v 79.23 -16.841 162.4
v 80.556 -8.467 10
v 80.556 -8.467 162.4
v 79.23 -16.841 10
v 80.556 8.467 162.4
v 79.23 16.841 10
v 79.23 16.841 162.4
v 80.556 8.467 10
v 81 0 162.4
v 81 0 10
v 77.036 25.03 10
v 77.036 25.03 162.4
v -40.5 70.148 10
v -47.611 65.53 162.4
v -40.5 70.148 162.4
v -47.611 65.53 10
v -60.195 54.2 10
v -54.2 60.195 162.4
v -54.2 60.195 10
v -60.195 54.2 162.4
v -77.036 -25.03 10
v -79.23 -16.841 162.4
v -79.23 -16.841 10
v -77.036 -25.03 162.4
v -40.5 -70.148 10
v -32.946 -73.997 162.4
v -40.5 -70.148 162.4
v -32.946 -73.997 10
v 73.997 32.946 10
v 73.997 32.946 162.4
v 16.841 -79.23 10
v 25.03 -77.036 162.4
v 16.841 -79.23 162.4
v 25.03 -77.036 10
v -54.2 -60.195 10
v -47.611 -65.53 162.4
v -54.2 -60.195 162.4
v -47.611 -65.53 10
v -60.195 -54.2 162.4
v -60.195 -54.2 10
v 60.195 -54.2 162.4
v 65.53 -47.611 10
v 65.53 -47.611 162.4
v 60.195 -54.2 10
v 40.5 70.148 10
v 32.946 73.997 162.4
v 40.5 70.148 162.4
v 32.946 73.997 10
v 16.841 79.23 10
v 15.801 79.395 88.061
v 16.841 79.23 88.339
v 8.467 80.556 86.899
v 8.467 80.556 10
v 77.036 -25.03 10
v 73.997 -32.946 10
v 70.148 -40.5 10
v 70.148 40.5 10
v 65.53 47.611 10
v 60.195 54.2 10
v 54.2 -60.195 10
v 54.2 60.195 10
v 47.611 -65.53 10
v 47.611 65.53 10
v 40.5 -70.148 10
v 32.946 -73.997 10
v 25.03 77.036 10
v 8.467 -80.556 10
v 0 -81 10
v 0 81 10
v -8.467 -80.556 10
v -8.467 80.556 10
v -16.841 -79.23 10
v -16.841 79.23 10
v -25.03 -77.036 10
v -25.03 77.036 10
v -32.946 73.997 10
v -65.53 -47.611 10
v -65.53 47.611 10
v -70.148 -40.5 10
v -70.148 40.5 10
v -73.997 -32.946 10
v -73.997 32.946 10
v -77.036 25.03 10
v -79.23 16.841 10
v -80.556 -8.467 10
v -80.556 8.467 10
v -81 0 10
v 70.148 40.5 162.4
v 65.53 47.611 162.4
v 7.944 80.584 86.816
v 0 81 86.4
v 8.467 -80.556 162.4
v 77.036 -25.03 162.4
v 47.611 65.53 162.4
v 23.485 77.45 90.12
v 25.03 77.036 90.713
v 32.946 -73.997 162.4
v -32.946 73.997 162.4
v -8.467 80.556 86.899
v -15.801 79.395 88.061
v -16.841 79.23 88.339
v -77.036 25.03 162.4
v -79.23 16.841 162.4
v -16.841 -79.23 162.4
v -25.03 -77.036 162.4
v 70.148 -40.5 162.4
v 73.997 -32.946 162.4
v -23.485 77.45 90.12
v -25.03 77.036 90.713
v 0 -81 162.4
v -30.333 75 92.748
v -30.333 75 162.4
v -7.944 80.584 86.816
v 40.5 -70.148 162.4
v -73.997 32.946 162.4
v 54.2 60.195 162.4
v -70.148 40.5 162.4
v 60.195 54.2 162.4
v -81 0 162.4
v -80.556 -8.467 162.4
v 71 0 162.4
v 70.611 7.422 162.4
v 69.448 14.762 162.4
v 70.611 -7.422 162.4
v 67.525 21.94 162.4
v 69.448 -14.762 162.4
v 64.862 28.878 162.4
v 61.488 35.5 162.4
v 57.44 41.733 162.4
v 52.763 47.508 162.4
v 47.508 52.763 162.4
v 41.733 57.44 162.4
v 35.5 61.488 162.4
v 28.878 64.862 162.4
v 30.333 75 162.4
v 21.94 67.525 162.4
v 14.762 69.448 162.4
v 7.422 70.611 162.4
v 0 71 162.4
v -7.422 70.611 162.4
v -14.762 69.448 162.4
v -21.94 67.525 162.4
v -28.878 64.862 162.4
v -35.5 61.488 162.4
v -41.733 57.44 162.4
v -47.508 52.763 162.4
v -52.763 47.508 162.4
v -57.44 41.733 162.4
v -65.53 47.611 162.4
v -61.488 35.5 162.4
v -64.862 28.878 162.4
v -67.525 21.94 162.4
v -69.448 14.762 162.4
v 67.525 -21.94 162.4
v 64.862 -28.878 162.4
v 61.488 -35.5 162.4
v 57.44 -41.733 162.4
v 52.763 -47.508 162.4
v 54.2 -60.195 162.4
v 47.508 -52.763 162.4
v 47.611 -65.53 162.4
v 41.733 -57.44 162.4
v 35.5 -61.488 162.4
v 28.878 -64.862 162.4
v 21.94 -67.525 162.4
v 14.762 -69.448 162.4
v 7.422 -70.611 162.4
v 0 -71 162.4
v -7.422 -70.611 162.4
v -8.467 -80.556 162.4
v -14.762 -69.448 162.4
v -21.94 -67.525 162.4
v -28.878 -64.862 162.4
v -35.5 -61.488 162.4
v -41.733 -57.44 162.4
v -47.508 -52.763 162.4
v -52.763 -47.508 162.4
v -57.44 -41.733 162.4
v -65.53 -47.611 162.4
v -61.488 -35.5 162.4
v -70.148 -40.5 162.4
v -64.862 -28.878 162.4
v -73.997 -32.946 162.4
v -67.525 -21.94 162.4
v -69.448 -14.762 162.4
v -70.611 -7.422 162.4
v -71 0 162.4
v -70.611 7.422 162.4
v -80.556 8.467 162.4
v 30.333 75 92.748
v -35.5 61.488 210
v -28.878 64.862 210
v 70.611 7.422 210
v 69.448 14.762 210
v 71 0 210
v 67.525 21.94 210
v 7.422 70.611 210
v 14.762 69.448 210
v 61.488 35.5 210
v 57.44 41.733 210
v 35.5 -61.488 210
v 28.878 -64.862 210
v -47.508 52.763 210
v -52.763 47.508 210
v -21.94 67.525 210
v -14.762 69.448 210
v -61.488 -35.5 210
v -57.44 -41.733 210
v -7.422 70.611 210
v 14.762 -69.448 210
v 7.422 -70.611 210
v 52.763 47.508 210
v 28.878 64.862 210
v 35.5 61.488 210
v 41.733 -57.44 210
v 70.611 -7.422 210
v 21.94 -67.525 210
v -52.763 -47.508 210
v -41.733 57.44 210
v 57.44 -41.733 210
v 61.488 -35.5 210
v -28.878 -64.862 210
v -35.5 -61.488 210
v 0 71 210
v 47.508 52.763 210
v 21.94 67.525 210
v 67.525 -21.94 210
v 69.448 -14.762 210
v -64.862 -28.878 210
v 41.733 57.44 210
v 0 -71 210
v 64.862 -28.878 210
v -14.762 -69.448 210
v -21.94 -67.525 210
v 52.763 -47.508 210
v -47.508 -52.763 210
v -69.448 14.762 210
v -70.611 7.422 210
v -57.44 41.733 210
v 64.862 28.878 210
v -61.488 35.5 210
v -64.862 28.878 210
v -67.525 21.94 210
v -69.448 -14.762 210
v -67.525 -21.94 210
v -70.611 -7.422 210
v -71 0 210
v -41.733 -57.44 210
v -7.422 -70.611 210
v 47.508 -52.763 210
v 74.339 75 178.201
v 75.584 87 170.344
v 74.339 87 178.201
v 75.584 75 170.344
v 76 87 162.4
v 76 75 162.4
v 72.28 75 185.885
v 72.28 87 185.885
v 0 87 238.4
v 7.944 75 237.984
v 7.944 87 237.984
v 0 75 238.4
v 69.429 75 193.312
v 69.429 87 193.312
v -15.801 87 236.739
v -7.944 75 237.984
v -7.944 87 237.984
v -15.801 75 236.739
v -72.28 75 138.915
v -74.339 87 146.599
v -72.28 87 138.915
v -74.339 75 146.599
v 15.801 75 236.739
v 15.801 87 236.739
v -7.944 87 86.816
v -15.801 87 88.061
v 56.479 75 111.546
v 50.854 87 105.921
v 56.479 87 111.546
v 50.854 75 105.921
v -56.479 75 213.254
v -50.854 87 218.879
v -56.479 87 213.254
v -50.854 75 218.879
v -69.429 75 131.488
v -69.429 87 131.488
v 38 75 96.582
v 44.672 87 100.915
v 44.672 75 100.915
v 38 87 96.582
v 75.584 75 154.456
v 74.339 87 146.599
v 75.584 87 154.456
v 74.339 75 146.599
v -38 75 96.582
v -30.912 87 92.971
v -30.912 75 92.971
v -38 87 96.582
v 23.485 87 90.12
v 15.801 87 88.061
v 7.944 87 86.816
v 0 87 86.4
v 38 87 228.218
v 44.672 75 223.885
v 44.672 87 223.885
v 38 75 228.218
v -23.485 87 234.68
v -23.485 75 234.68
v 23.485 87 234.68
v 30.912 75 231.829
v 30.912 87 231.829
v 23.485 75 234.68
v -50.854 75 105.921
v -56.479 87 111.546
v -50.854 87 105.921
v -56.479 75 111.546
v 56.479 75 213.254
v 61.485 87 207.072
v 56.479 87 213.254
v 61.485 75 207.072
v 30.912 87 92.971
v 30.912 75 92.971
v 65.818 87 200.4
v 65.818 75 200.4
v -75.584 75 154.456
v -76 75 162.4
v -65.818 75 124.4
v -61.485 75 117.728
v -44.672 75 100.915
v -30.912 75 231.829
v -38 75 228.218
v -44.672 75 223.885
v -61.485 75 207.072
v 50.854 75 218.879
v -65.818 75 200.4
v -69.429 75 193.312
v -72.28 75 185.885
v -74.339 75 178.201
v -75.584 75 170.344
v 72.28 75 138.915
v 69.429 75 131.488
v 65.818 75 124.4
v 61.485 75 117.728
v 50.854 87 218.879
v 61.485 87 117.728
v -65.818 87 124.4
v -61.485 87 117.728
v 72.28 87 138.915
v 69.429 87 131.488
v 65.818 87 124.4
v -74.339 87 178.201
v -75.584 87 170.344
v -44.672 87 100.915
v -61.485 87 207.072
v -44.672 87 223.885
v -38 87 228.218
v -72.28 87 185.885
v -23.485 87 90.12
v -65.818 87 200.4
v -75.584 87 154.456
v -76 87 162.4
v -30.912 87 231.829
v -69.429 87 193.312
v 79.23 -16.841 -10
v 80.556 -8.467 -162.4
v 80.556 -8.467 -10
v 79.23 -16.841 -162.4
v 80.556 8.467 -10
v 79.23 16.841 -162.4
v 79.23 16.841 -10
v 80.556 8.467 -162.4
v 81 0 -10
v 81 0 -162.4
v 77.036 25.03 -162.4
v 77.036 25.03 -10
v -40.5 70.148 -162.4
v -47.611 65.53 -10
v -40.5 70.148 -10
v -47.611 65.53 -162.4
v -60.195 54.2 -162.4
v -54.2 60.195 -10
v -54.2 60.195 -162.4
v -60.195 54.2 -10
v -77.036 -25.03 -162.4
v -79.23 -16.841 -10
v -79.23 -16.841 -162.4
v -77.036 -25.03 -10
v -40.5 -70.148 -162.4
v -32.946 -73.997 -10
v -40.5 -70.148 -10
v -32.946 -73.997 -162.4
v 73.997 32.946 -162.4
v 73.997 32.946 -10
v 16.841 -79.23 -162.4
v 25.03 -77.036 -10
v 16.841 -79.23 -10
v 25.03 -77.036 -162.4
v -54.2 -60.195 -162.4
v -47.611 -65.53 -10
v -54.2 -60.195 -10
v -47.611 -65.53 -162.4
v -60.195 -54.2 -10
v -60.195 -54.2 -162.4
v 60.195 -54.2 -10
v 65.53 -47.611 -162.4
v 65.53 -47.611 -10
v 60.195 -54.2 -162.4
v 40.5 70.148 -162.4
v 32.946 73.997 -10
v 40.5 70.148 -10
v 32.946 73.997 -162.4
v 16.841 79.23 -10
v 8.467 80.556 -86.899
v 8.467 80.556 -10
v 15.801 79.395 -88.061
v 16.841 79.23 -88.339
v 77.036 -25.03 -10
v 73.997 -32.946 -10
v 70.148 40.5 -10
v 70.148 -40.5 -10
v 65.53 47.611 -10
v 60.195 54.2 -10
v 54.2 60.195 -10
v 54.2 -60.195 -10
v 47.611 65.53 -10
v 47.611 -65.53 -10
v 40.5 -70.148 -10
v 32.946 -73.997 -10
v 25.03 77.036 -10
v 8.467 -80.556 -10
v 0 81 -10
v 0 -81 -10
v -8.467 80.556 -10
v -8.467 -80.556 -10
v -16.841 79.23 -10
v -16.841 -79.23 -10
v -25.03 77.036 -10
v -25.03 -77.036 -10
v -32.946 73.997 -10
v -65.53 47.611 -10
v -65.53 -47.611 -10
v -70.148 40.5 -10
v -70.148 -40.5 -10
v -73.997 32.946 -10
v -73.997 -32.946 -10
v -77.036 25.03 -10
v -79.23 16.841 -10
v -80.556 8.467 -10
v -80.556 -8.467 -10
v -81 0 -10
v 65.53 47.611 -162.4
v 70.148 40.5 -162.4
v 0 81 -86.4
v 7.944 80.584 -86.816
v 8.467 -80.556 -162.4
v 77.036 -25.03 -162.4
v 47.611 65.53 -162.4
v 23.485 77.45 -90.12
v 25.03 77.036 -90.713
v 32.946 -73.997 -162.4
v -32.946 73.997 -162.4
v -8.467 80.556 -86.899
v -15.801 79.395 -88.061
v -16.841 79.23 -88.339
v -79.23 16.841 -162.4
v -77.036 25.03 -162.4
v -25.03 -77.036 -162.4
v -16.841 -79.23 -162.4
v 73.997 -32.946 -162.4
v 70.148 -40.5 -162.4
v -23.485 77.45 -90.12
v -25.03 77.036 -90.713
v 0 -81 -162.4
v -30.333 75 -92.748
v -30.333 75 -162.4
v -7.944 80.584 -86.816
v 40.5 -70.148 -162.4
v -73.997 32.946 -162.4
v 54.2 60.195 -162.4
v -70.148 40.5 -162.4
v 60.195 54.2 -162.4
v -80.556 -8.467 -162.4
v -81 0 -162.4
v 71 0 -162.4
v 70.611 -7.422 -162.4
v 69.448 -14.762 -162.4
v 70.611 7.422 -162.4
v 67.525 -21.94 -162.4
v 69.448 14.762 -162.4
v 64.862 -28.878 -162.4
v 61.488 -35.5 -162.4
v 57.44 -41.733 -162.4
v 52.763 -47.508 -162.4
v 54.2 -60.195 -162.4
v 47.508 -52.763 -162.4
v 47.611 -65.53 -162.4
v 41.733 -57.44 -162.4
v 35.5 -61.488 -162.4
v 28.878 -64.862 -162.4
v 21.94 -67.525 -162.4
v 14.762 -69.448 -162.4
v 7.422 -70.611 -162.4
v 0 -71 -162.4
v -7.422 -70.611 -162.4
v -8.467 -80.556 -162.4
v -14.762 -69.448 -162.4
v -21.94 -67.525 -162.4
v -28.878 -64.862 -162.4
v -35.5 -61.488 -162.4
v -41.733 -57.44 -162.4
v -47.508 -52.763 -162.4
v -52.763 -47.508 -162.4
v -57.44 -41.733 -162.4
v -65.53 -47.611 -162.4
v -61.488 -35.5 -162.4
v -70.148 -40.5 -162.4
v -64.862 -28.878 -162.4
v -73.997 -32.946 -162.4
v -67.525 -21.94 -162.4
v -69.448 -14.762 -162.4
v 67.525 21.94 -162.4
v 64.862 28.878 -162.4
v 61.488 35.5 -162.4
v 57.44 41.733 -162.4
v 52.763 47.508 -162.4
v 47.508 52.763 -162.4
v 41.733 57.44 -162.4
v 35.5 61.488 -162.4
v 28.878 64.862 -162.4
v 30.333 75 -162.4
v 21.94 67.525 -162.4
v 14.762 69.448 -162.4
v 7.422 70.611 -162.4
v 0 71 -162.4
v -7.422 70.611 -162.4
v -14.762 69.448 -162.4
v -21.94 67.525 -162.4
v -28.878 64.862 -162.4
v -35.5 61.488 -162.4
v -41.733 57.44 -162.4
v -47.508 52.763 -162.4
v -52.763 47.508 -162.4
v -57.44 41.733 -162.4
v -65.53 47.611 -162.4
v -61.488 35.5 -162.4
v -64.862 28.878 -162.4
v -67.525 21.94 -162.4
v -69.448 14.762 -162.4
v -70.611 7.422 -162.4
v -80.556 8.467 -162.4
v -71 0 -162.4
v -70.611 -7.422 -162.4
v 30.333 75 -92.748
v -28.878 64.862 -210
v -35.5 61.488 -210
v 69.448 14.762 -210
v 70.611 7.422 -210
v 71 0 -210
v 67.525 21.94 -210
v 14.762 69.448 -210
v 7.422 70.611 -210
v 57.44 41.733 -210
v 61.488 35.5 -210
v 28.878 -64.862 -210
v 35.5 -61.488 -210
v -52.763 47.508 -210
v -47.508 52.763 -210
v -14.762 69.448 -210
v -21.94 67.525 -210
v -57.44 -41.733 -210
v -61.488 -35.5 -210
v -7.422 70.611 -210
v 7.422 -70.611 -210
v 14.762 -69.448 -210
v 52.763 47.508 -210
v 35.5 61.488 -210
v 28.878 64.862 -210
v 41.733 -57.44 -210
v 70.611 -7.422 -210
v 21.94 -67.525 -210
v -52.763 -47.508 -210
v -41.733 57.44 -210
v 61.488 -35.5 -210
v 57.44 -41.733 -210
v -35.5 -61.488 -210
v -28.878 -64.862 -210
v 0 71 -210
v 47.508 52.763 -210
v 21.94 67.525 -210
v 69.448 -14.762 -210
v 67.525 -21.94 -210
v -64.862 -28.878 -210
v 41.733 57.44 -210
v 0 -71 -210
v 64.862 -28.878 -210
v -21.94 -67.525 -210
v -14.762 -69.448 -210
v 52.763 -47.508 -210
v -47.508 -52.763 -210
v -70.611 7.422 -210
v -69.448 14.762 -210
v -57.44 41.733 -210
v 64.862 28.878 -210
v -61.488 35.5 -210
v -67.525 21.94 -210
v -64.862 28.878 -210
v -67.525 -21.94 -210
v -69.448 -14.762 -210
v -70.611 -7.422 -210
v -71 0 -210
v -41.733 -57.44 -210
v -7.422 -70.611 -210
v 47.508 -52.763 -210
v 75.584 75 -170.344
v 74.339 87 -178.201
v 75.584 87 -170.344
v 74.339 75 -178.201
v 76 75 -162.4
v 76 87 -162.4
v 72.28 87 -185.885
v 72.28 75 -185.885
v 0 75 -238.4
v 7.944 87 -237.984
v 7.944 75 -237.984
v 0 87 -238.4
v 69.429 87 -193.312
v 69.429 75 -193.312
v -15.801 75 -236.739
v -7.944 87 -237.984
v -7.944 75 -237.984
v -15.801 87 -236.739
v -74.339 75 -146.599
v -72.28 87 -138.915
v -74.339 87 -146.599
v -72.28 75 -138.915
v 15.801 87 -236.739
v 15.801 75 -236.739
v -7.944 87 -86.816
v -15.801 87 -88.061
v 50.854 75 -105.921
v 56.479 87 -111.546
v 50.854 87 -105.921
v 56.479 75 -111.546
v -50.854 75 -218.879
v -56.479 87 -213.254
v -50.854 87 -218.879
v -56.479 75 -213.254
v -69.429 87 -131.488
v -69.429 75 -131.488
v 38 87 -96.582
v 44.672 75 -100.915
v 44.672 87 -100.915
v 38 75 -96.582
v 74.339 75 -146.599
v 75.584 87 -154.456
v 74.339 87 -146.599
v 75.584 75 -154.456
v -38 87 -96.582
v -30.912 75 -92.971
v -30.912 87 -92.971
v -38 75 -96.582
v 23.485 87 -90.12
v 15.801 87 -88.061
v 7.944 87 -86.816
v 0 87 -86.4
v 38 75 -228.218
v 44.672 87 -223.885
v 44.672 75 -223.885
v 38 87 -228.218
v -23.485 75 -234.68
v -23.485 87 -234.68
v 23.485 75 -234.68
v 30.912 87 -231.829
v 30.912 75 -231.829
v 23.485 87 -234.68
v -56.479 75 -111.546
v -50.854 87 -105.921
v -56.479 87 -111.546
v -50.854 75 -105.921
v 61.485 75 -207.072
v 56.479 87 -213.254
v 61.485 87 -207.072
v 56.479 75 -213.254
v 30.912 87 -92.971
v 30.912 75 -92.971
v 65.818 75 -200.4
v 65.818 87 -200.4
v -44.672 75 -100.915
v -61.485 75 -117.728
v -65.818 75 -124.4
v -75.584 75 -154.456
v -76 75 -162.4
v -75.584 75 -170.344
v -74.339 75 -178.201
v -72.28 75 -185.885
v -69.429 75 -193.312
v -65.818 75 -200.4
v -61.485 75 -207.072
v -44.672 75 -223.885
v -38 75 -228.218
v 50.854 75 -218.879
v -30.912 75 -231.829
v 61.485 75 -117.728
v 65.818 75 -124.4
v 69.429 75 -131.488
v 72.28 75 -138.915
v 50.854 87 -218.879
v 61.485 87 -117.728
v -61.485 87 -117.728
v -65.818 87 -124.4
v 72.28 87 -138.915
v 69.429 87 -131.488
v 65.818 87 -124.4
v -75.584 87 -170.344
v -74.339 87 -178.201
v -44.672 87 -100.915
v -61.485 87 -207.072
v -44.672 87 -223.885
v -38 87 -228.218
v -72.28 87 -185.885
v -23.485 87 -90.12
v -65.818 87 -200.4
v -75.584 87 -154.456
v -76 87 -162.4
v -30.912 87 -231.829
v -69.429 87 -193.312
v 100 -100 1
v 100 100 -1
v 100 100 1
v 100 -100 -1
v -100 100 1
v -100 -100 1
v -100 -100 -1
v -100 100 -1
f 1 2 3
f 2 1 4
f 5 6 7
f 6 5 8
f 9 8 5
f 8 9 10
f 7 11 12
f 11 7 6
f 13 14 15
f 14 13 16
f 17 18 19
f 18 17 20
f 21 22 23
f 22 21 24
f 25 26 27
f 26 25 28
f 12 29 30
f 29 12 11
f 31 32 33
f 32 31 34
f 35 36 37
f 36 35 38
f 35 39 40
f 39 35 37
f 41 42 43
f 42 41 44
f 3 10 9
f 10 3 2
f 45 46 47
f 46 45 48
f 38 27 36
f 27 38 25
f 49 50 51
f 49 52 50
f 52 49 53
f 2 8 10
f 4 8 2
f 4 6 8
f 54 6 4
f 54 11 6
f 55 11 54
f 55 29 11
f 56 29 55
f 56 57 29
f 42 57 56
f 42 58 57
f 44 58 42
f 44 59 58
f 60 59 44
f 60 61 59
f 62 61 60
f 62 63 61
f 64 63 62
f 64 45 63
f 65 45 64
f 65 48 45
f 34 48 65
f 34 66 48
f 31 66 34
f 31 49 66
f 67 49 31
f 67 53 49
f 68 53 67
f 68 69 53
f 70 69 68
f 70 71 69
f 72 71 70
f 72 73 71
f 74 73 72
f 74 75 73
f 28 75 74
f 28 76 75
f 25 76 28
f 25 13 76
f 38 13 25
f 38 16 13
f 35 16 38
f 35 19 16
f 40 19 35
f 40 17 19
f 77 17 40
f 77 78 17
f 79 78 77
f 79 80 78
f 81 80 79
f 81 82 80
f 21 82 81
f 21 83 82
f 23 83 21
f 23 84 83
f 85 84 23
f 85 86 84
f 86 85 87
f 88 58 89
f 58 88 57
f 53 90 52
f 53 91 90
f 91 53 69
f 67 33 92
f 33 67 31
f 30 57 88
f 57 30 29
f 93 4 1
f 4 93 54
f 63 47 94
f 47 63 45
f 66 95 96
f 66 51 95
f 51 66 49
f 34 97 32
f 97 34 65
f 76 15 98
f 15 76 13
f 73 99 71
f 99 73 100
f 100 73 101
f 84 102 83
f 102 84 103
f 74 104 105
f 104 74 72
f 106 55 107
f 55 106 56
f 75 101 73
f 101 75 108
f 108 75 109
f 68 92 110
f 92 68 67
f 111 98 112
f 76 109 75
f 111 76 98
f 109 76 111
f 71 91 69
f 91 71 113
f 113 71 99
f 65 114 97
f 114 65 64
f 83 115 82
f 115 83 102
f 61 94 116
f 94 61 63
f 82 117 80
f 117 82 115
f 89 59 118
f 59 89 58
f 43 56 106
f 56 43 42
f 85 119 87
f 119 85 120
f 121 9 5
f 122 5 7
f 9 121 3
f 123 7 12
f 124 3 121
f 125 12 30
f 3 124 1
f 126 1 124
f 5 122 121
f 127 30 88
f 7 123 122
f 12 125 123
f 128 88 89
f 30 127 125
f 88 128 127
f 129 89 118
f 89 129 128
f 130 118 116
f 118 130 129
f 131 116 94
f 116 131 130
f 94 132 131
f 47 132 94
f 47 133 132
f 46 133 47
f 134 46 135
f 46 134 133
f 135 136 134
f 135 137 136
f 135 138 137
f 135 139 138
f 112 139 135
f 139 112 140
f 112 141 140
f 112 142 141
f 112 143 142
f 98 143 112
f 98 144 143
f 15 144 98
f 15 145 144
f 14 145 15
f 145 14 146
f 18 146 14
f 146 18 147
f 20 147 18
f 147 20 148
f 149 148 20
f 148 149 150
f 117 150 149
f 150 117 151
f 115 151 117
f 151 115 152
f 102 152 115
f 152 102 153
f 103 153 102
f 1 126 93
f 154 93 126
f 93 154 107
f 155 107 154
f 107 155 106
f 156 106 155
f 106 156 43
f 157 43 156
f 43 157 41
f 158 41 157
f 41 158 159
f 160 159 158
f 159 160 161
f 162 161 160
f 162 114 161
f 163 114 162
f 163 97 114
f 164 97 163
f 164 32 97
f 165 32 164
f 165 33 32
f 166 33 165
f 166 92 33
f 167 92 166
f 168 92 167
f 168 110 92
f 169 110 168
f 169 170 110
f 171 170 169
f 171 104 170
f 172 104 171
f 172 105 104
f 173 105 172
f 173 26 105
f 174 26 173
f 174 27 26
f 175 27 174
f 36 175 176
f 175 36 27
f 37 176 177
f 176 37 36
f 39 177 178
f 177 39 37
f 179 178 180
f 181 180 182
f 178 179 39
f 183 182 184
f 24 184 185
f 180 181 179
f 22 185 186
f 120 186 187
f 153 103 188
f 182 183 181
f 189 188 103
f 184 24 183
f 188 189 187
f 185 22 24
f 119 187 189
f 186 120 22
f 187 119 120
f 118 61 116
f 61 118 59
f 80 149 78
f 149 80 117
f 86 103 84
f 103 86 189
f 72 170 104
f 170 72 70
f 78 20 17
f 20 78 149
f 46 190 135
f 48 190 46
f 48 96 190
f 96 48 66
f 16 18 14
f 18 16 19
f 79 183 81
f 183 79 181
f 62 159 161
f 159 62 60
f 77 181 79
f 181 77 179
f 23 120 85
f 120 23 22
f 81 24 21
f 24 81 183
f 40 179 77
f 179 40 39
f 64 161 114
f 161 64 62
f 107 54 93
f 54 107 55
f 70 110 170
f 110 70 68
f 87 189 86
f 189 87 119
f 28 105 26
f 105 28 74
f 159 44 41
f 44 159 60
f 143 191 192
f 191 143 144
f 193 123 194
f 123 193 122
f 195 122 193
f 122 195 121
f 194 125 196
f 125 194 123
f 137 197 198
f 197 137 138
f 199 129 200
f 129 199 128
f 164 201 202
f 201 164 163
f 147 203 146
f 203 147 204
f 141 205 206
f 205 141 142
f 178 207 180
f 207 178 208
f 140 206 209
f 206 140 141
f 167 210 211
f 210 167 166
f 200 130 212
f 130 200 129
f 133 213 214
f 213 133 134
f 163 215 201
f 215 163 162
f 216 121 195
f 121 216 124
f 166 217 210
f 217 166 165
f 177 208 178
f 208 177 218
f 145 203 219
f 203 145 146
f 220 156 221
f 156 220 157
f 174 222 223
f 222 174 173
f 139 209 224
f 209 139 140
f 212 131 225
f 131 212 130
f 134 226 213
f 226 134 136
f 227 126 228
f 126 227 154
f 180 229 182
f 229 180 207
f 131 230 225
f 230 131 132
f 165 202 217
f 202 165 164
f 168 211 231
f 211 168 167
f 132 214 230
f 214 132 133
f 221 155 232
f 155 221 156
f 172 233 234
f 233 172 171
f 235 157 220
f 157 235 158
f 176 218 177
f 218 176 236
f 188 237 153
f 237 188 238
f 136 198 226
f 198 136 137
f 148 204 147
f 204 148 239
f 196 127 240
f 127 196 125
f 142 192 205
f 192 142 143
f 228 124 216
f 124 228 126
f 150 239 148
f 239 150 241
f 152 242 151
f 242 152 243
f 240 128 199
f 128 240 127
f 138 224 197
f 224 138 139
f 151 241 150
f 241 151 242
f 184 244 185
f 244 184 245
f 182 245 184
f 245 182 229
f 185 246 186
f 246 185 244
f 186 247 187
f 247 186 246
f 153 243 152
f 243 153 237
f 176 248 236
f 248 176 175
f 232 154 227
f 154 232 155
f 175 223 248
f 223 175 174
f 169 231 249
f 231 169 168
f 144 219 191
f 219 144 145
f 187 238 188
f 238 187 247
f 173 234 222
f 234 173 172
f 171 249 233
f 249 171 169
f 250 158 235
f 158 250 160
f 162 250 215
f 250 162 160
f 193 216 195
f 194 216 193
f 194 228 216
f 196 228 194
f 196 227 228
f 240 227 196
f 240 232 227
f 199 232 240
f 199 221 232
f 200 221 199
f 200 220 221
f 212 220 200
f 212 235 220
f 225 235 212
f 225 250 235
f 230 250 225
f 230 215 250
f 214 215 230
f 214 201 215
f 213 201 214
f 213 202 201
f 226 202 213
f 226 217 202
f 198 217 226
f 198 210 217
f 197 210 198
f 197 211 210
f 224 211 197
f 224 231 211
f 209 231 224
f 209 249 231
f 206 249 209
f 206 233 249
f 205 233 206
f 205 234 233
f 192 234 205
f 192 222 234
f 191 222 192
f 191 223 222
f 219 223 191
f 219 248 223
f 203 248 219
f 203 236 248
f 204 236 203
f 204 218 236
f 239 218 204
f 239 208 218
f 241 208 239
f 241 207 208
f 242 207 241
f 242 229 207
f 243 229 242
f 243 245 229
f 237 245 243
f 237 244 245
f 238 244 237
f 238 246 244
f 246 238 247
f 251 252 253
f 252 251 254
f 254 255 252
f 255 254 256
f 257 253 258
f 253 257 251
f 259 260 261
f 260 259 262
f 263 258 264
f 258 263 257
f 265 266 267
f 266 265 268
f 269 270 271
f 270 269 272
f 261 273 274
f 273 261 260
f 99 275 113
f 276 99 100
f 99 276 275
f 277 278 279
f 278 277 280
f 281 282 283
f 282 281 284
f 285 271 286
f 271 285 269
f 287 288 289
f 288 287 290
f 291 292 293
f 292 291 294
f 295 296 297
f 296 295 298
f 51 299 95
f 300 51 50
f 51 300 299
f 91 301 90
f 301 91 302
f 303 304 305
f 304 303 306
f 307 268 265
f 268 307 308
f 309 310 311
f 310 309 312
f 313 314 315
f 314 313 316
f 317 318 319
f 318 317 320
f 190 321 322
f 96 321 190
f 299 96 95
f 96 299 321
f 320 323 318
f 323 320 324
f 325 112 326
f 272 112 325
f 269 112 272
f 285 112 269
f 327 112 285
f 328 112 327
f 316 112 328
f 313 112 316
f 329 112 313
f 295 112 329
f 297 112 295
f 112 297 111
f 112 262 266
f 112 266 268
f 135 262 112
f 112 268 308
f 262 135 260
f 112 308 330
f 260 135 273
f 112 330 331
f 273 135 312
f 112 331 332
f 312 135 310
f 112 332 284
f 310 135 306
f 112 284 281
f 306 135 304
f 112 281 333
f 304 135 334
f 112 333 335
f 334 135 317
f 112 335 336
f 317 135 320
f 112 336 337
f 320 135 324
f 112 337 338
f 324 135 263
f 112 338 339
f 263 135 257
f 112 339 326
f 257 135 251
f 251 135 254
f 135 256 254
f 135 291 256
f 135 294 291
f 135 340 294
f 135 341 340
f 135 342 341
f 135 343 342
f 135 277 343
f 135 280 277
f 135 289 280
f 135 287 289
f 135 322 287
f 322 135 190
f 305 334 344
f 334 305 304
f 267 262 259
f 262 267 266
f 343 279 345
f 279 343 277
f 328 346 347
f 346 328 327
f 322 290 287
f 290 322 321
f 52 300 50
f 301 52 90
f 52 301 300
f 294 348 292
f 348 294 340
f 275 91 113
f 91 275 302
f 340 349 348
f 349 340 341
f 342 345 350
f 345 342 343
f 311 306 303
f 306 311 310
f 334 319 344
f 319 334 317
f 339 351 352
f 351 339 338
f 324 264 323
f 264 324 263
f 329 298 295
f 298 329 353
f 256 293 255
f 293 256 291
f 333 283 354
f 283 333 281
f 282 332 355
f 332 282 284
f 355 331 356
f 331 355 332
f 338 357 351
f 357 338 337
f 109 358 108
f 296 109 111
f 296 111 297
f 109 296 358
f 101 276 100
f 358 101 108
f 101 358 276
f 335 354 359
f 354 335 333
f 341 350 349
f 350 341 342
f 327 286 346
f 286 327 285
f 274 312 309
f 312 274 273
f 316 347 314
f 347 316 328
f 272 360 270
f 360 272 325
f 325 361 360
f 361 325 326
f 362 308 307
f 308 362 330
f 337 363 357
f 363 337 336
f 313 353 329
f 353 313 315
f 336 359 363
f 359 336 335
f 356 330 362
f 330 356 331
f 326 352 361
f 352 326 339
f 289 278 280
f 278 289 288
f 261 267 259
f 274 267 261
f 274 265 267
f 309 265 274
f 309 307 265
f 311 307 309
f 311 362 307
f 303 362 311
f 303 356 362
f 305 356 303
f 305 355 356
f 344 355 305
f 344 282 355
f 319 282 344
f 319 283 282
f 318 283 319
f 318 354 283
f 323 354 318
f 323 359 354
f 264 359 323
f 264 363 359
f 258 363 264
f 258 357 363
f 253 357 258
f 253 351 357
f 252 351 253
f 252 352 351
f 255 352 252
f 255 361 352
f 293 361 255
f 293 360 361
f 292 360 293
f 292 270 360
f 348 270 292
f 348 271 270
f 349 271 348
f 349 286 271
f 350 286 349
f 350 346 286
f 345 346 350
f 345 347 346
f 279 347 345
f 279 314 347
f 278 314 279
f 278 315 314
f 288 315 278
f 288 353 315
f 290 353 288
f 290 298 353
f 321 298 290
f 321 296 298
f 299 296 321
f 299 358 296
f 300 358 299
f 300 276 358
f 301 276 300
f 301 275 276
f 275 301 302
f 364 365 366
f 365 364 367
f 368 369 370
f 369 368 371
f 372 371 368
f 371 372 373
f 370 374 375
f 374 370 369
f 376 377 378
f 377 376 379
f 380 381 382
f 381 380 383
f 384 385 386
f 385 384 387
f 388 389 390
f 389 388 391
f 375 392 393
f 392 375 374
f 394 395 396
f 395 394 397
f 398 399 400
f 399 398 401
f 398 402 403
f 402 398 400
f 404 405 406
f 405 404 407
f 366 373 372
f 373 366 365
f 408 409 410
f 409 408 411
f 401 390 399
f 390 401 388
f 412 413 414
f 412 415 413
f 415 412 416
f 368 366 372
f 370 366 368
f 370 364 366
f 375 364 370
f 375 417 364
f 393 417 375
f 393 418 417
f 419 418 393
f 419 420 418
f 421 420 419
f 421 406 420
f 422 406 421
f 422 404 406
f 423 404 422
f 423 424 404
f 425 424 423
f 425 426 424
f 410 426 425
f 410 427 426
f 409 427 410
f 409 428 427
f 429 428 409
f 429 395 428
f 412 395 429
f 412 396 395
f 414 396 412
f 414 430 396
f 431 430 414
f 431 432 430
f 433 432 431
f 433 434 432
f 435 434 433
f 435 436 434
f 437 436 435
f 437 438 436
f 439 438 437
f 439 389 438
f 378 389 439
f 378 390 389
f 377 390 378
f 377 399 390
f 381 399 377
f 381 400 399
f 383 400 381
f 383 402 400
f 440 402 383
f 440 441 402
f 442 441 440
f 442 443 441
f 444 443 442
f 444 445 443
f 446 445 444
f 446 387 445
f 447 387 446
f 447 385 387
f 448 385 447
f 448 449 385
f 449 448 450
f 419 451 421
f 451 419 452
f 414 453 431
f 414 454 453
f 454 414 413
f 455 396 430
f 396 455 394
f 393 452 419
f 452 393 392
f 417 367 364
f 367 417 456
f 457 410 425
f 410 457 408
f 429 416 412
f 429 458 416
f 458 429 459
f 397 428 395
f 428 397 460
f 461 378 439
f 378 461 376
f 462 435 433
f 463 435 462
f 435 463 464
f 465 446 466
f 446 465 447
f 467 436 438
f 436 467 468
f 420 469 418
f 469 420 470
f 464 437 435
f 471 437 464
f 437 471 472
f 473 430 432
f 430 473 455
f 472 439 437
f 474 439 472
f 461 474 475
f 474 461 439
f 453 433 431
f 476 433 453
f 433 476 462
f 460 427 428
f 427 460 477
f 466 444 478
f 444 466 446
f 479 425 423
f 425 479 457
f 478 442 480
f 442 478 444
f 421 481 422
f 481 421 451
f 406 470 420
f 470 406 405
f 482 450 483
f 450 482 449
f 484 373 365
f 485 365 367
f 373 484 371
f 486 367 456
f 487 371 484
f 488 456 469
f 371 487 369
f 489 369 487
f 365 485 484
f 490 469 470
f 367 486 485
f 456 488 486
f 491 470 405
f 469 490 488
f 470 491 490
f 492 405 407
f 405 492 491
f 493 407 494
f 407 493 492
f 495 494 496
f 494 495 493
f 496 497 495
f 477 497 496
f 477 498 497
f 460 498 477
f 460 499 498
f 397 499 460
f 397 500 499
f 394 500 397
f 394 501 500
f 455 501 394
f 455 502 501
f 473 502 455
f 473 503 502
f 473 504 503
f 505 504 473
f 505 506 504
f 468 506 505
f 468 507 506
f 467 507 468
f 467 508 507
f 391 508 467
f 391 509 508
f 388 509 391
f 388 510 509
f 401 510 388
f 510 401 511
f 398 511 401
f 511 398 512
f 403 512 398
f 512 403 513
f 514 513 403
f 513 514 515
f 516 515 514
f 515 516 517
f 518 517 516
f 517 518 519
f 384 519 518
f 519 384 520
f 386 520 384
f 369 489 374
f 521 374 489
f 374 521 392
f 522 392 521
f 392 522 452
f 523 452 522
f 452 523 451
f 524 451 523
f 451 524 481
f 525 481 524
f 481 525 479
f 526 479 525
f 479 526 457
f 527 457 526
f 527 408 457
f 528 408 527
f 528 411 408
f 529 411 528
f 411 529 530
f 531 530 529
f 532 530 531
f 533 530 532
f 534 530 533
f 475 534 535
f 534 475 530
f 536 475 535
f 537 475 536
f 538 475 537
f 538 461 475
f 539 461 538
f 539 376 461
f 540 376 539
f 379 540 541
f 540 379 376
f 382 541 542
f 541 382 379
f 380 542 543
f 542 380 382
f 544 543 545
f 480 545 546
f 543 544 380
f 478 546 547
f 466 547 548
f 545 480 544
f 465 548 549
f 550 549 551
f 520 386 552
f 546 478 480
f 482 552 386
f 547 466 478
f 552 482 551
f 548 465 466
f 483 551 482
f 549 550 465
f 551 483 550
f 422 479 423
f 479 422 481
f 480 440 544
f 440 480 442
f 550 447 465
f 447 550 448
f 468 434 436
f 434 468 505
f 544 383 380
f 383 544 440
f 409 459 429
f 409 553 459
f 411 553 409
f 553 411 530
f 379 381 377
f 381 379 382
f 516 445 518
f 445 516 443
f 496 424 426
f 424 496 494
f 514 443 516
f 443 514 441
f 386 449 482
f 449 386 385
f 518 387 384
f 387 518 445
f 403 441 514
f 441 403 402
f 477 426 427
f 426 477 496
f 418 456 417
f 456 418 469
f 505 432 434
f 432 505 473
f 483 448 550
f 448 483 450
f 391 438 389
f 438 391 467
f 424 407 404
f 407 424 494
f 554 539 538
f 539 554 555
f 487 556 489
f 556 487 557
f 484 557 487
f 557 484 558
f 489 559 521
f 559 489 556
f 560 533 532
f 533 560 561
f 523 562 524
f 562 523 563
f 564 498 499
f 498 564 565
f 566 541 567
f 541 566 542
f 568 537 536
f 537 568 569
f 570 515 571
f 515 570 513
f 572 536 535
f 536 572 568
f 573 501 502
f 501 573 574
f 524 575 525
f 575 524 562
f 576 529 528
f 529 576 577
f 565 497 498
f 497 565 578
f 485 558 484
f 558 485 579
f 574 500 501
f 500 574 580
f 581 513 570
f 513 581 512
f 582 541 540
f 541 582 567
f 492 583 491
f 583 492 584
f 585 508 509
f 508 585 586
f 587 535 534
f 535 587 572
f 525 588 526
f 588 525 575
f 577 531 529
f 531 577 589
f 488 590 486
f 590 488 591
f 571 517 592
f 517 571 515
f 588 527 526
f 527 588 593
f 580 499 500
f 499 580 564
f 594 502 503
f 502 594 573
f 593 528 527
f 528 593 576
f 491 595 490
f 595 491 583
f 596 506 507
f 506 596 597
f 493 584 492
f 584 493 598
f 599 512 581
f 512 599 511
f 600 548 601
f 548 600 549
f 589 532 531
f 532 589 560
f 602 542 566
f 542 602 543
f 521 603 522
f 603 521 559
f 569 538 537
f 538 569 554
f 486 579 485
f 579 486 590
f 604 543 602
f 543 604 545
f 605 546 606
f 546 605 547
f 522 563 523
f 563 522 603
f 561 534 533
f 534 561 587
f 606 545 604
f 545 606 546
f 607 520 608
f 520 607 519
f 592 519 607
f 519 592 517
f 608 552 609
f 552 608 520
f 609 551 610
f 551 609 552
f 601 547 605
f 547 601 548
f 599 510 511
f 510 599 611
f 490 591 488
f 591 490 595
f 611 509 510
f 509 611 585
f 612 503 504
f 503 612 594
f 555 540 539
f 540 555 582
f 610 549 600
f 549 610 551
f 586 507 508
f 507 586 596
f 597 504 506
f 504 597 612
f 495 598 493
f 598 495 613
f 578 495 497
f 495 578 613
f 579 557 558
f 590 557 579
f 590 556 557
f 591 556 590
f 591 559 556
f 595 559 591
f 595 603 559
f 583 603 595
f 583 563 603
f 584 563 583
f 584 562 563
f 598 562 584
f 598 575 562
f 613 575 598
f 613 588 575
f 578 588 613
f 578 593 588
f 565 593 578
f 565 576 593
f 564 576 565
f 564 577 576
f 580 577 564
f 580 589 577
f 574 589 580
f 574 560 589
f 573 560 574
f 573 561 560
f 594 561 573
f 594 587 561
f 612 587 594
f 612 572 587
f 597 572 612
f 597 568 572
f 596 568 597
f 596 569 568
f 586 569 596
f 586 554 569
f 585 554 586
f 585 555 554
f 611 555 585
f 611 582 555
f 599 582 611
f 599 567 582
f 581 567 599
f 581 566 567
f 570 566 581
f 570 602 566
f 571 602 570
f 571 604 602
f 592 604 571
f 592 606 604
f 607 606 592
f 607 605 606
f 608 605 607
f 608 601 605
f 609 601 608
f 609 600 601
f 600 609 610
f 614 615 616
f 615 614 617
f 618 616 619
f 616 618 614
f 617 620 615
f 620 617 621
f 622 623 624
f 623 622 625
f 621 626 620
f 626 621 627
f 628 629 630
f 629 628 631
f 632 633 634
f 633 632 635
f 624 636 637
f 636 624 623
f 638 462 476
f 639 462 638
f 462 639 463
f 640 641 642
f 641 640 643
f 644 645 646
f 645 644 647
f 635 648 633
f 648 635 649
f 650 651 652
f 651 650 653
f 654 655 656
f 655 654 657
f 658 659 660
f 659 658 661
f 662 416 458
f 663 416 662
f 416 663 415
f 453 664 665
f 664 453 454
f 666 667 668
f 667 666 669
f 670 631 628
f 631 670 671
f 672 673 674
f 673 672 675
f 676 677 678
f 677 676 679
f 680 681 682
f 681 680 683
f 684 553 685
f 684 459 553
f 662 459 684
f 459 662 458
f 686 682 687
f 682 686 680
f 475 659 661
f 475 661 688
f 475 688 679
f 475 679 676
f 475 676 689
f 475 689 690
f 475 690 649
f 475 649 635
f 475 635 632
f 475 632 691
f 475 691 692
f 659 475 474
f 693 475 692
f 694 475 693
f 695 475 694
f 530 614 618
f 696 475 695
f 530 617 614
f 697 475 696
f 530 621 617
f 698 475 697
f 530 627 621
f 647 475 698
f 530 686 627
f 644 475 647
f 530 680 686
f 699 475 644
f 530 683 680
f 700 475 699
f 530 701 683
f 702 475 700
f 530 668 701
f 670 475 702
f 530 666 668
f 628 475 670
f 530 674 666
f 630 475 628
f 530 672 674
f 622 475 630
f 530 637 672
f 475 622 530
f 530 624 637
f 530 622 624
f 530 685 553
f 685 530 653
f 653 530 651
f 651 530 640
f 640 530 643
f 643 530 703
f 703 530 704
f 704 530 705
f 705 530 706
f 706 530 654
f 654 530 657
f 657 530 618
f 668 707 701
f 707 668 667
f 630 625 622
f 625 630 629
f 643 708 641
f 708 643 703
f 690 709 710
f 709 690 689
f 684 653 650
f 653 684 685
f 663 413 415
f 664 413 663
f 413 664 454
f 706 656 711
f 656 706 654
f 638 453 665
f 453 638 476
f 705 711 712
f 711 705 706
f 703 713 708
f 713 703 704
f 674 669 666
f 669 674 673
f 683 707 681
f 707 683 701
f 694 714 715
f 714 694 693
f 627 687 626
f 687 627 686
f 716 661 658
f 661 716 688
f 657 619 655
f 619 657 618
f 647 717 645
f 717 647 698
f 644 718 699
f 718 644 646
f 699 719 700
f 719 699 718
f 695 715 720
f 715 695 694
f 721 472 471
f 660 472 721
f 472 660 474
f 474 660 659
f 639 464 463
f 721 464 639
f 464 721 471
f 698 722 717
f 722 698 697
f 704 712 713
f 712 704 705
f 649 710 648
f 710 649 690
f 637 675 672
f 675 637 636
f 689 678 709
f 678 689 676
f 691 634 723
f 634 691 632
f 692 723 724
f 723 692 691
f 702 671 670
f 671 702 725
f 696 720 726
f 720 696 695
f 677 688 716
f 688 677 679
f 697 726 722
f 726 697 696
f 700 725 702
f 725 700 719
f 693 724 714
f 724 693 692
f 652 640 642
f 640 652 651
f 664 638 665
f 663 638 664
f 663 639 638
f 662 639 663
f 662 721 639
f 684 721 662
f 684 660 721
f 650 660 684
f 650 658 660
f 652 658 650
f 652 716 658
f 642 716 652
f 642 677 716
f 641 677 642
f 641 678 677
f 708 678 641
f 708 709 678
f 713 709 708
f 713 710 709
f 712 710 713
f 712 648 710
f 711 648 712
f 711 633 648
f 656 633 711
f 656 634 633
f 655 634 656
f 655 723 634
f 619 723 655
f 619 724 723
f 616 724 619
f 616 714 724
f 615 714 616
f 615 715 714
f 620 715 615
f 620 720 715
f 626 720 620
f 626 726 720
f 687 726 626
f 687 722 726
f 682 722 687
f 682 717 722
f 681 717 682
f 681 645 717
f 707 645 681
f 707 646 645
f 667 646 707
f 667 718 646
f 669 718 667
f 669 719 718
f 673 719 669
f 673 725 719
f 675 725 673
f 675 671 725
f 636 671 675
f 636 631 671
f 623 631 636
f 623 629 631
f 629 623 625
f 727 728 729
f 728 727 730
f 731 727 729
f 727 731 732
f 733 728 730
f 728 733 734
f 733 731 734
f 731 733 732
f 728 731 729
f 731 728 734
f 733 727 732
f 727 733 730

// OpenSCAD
// ============================================================================
// FireProve System - Emergency Pipe Separation & Sealing Cap Array
// Implements 6 inches of clearance shafts for both Cannon and Hydrant terminals
// ============================================================================

$fn = 60; // Render configuration

// Standard Dimensional Metrics (mm)
PIPE_OUTER_D      = 142.00; // Solid heavy-wall copper piping
CLEARANCE_GAP     = 152.40; // Exactly 6 inches of travel clearance
CAP_THICKNESS     = 12.00;  // Stamped structural sealing gate plate

module Emergency_Isolation_Coupling() {
    
    // 1. Center Shear Axis (The designated structural failure fracture line)
    color("Red") translate([0, 0, 0]) 
        cube([200, 200, 2], center=true);

    // =====================================================================
    // SIDE A: CANNON ISOLATION ASSEMBLY (Upper Terminal Deck)
    // =====================================================================
    translate([0, 0, 10]) union() {
        // Main structural copper pipeline sleeve routing back to cannon yoke
        color("Copper") cylinder(h=200, d=PIPE_OUTER_D, center=false);
        
        // 6-Inch Mechanical Clearance Sliding Rail Guides
        color("DimGray") translate([0, 0, 0]) difference() {
            cylinder(h=CLEARANCE_GAP, d=PIPE_OUTER_D + 20, center=false);
            cylinder(h=CLEARANCE_GAP + 2, d=PIPE_OUTER_D, center=false);
        }
        
        // Automated High-Pressure Spring Flap Cap (Open state during normal flow)
        // Positioned 6 inches back from the shear zone to clear broken edges
        translate([0, PIPE_OUTER_D/2 + 10, CLEARANCE_GAP]) 
            color("DarkSlateGray") rotate([90, 0, 0])
                cylinder(h=CAP_THICKNESS, d=PIPE_OUTER_D + 10, center=true);
    }

    // =====================================================================
    // SIDE B: HYDRANT ISOLATION ASSEMBLY (Lower Terminal Deck)
    // =====================================================================
    translate([0, 0, -10]) scale([1, 1, -1]) union() {
        // Main structural copper line leading back to the fire hydrant input
        color("Copper") cylinder(h=200, d=PIPE_OUTER_D, center=false);
        
        // 6-Inch Mechanical Clearance Sliding Rail Guides
        color("DimGray") translate([0, 0, 0]) difference() {
            cylinder(h=CLEARANCE_GAP, d=PIPE_OUTER_D + 20, center=false);
            cylinder(h=CLEARANCE_GAP + 2, d=PIPE_OUTER_D, center=false);
        }
        
        // Automated High-Pressure Spring Flap Cap (Open state during normal flow)
        // Positioned 6 inches back from the shear zone to clear broken edges
        translate([0, PIPE_OUTER_D/2 + 10, CLEARANCE_GAP]) 
            color("DarkSlateGray") rotate([90, 0, 0])
                cylinder(h=CAP_THICKNESS, d=PIPE_OUTER_D + 10, center=true);
    }
}

// Render execution call point
Emergency_Isolation_Coupling();
